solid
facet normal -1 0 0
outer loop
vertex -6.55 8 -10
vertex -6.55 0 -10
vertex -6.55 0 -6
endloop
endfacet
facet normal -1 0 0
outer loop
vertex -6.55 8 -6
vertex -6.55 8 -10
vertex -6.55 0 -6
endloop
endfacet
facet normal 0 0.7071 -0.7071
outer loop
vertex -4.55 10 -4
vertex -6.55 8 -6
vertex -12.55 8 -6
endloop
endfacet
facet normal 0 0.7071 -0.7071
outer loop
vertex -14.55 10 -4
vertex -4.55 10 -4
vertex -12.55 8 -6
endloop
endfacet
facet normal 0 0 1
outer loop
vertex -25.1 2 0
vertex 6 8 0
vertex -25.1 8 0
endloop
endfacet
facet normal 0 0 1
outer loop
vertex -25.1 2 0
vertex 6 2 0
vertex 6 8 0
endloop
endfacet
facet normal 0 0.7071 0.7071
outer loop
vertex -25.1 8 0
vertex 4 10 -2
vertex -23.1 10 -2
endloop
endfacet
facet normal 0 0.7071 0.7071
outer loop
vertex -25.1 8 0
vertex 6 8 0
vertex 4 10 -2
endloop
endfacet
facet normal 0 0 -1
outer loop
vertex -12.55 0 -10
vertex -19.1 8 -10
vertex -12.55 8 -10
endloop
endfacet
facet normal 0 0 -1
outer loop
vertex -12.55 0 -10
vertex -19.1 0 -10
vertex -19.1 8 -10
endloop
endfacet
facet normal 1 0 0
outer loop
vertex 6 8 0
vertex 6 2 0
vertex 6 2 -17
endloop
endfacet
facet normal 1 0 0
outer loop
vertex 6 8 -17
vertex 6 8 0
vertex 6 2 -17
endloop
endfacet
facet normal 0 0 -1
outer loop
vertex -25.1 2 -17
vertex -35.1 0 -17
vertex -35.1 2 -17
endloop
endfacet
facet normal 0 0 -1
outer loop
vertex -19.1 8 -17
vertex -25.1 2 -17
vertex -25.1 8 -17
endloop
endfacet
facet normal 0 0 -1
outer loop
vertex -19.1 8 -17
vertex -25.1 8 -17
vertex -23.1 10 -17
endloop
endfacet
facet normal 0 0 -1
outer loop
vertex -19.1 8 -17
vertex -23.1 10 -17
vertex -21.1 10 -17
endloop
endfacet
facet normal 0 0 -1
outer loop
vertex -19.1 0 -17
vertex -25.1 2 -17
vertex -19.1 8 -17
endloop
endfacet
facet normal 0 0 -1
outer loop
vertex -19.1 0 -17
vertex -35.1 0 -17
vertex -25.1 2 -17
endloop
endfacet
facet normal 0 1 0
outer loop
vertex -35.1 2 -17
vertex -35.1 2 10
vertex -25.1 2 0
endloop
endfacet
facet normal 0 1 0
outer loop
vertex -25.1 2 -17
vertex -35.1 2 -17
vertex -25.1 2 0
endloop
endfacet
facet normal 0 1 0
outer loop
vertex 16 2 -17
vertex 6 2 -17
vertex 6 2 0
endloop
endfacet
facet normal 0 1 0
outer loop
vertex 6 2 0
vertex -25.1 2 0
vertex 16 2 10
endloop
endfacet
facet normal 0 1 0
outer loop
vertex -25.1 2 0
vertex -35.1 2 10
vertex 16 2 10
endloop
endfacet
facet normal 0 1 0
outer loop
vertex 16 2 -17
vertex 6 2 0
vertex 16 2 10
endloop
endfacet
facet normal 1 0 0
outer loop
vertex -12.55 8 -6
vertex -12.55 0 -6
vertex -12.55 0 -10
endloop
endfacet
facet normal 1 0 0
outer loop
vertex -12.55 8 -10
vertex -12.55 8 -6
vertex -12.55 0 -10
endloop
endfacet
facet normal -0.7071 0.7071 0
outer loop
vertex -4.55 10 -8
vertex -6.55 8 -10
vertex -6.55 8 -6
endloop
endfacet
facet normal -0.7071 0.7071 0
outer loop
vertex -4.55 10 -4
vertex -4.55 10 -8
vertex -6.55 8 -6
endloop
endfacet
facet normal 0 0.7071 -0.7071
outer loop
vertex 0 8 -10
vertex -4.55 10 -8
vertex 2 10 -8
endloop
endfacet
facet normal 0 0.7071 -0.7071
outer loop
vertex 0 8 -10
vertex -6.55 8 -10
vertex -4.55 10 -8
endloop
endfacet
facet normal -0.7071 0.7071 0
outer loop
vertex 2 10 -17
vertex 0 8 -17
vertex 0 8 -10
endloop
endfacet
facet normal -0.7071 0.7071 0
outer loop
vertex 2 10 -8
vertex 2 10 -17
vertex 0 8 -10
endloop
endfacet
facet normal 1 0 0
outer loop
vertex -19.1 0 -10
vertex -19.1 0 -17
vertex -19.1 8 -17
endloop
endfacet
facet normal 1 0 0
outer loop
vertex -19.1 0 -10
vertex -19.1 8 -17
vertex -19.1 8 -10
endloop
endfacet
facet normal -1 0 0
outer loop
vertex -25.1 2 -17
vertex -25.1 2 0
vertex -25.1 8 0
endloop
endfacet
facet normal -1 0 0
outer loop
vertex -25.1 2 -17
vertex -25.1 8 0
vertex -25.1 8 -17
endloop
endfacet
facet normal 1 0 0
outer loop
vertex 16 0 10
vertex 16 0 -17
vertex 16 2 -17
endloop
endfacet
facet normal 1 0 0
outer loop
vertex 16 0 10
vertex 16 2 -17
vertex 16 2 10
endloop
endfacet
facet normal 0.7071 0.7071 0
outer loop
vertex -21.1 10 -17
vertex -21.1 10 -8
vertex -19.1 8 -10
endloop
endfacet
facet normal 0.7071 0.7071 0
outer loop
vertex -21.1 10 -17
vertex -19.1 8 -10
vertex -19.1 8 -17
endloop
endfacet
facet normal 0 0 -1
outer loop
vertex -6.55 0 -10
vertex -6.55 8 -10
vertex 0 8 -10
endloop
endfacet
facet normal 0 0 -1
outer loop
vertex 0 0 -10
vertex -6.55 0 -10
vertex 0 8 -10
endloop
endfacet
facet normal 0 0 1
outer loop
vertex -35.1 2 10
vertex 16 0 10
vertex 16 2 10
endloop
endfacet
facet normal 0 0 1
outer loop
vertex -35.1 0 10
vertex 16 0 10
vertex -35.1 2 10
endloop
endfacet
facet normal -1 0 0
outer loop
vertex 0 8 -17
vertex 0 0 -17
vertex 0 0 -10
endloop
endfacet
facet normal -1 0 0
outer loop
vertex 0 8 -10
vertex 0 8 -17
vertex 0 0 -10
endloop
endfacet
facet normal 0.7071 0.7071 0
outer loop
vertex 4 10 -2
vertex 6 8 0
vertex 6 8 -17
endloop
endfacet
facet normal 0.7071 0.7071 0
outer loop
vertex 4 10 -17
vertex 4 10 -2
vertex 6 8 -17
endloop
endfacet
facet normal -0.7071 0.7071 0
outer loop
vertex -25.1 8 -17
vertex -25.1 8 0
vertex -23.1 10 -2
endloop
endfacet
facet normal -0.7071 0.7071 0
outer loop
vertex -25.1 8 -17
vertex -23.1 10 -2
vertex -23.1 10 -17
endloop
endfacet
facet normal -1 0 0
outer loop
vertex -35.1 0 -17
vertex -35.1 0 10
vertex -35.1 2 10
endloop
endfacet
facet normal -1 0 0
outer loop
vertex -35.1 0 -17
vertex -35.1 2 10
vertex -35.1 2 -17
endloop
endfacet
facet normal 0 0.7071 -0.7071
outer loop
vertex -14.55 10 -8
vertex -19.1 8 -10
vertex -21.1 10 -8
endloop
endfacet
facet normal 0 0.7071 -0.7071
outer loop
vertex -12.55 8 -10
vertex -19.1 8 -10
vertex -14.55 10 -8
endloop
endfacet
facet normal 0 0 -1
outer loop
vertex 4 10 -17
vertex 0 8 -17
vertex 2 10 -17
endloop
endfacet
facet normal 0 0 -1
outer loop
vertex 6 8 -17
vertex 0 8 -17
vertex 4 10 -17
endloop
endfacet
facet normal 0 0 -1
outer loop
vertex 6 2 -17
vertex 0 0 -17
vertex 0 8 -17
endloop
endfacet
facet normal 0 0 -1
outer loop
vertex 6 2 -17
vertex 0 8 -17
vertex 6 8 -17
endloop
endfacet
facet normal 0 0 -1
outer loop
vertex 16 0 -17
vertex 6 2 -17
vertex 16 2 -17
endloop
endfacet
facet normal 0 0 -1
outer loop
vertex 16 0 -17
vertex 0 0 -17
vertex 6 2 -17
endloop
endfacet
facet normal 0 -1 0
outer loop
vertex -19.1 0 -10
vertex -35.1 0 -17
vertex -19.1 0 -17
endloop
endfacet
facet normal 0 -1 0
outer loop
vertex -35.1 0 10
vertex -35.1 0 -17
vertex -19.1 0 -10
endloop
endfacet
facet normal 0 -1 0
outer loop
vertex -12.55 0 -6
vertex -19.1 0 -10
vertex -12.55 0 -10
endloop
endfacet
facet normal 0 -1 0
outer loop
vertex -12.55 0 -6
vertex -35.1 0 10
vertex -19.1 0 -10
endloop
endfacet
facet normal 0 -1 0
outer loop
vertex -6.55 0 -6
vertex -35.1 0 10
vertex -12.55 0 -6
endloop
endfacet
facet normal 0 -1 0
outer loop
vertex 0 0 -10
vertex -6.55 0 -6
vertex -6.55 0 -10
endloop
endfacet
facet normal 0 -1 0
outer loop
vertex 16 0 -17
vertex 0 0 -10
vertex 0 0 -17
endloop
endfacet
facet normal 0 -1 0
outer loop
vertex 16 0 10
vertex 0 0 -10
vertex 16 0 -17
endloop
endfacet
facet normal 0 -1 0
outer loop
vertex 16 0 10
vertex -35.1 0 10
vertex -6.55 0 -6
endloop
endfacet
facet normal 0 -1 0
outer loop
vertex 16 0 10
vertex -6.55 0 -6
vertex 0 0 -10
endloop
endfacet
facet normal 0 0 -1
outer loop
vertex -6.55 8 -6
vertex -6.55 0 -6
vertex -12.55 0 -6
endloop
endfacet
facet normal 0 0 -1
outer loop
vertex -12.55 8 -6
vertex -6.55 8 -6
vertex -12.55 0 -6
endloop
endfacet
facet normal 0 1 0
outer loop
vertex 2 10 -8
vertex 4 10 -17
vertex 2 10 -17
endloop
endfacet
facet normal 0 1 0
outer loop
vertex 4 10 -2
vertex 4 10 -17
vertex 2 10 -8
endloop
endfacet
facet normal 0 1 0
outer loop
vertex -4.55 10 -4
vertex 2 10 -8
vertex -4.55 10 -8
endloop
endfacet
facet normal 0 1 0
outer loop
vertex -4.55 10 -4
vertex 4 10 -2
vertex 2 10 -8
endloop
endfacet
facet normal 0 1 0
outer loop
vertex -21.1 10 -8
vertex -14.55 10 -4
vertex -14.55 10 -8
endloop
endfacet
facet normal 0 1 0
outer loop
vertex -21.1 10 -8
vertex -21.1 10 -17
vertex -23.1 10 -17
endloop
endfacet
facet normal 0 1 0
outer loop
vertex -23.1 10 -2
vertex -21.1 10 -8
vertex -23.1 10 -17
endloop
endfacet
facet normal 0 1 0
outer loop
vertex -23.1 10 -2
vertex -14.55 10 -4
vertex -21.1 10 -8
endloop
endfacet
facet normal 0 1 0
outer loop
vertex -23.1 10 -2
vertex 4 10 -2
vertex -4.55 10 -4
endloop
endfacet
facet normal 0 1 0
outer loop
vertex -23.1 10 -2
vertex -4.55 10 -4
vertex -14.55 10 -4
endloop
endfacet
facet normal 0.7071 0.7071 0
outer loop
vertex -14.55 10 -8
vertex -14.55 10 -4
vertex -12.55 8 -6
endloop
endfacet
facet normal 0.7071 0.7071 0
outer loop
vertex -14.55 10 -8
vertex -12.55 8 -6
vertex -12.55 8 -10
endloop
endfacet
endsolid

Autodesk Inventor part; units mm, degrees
ref_plane "YZ Plane" through (0, 0, 0) normal (1, 0, 0) x (0, 1, 0)
ref_plane "XZ Plane" through (0, 0, 0) normal (0, 1, 0) x (-1, 0, 0)
ref_plane "XY Plane" through (0, 0, 0) normal (0, 0, 1) x (1, 0, 0)
sketch "Sketch1" plane through (0, 0, 0) normal (0, 1, 0) x (-1, 0, 0)
  line L0 (0, 0) -> (19.1, 0)
  line L1 (19.1, 0) -> (19.1, -10)
  line L2 (19.1, -10) -> (0, -10)
  line L3 (0, -10) -> (0, 0)
  line L4 (12.55, -10) -> (6.55, -10)
  line L5 (6.55, -10) -> (6.55, -6)
  line L6 (6.55, -6) -> (12.55, -6)
  line L7 (12.55, -6) -> (12.55, -10)
  line L8 (0, 0) -> (-6, 0)
  line L9 (-6, 0) -> (-6, -17)
  line L10 (-6, -17) -> (0, -17)
  line L11 (0, -17) -> (0, 0)
  line L12 (19.1, 0) -> (25.1, 0)
  line L13 (25.1, 0) -> (25.1, -17)
  line L14 (25.1, -17) -> (19.1, -17)
  line L15 (19.1, -17) -> (19.1, 0)
  point P0 (9.55, -6)
  point P1 (9.55, 0)
  point P2 (6.55, -10)
  point P3 (0, -10)
  dimension "d0" = 6
  dimension "d1" = 19.1
  dimension "d2" = 4
  dimension "d3" = 10
  dimension "d6" = 6
  dimension "d7" = 6
  dimension "d8" = 17
  dimension "d20" = 7
extrude "Extrusion1" add sketch "Sketch1" along normal blind 10 contours L0 L1 L2 L7 L6 L5 L3 | L3 L11 L10 L9 L8 | L12 L13 L14 L15 L1
sketch "Sketch2" plane through (0, 0, 0) normal (0, -1, 0) x (1, 0, 0)
  line L0 (-25.1, 0) -> (6, 0) projected
  line L1 (-25.1, -17) -> (-25.1, 0) projected
  line L2 (-19.1, -17) -> (-25.1, -17) projected
  line L3 (-19.1, -10) -> (-19.1, -17) projected
  line L4 (-12.55, -10) -> (-19.1, -10) projected
  line L5 (-12.55, -6) -> (-12.55, -10) projected
  line L6 (-6.55, -6) -> (-12.55, -6) projected
  line L7 (-6.55, -10) -> (-6.55, -6) projected
  line L8 (0, -10) -> (-6.55, -10) projected
  line L9 (0, -17) -> (0, -10) projected
  line L10 (6, -17) -> (0, -17) projected
  line L11 (6, 0) -> (6, -17) projected
  line L12 (6, -17) -> (16, -17)
  line L13 (16, -17) -> (16, 10)
  line L14 (16, 10) -> (-35.1, 10)
  line L15 (-35.1, 10) -> (-35.1, -17)
  line L16 (-35.1, -17) -> (-25.1, -17)
  point P0 (0, 0)
  dimension "d9" = 10
  dimension "d10" = 10
  dimension "d11" = 10
extrude "Extrusion2" add sketch "Sketch2" against normal blind 2 contours L1 L16 L15 L14 L13 L12 L11 L0
chamfer "Chamfer1" distance 2 angle 45 7 edges at (-19.1, 10, -13.5) (-15.825, 10, -10) (-9.55, 10, -6) (-6.55, 10, -8) (0, 10, -13.5) (-3.275, 10, -10) (-12.55, 10, -8)
chamfer "Chamfer2" distance 2 angle 45 3 edges at (6, 10, -8.5) (-9.55, 10, 0) (-25.1, 10, -8.5)
properties part number "millmax_solder_rig"
